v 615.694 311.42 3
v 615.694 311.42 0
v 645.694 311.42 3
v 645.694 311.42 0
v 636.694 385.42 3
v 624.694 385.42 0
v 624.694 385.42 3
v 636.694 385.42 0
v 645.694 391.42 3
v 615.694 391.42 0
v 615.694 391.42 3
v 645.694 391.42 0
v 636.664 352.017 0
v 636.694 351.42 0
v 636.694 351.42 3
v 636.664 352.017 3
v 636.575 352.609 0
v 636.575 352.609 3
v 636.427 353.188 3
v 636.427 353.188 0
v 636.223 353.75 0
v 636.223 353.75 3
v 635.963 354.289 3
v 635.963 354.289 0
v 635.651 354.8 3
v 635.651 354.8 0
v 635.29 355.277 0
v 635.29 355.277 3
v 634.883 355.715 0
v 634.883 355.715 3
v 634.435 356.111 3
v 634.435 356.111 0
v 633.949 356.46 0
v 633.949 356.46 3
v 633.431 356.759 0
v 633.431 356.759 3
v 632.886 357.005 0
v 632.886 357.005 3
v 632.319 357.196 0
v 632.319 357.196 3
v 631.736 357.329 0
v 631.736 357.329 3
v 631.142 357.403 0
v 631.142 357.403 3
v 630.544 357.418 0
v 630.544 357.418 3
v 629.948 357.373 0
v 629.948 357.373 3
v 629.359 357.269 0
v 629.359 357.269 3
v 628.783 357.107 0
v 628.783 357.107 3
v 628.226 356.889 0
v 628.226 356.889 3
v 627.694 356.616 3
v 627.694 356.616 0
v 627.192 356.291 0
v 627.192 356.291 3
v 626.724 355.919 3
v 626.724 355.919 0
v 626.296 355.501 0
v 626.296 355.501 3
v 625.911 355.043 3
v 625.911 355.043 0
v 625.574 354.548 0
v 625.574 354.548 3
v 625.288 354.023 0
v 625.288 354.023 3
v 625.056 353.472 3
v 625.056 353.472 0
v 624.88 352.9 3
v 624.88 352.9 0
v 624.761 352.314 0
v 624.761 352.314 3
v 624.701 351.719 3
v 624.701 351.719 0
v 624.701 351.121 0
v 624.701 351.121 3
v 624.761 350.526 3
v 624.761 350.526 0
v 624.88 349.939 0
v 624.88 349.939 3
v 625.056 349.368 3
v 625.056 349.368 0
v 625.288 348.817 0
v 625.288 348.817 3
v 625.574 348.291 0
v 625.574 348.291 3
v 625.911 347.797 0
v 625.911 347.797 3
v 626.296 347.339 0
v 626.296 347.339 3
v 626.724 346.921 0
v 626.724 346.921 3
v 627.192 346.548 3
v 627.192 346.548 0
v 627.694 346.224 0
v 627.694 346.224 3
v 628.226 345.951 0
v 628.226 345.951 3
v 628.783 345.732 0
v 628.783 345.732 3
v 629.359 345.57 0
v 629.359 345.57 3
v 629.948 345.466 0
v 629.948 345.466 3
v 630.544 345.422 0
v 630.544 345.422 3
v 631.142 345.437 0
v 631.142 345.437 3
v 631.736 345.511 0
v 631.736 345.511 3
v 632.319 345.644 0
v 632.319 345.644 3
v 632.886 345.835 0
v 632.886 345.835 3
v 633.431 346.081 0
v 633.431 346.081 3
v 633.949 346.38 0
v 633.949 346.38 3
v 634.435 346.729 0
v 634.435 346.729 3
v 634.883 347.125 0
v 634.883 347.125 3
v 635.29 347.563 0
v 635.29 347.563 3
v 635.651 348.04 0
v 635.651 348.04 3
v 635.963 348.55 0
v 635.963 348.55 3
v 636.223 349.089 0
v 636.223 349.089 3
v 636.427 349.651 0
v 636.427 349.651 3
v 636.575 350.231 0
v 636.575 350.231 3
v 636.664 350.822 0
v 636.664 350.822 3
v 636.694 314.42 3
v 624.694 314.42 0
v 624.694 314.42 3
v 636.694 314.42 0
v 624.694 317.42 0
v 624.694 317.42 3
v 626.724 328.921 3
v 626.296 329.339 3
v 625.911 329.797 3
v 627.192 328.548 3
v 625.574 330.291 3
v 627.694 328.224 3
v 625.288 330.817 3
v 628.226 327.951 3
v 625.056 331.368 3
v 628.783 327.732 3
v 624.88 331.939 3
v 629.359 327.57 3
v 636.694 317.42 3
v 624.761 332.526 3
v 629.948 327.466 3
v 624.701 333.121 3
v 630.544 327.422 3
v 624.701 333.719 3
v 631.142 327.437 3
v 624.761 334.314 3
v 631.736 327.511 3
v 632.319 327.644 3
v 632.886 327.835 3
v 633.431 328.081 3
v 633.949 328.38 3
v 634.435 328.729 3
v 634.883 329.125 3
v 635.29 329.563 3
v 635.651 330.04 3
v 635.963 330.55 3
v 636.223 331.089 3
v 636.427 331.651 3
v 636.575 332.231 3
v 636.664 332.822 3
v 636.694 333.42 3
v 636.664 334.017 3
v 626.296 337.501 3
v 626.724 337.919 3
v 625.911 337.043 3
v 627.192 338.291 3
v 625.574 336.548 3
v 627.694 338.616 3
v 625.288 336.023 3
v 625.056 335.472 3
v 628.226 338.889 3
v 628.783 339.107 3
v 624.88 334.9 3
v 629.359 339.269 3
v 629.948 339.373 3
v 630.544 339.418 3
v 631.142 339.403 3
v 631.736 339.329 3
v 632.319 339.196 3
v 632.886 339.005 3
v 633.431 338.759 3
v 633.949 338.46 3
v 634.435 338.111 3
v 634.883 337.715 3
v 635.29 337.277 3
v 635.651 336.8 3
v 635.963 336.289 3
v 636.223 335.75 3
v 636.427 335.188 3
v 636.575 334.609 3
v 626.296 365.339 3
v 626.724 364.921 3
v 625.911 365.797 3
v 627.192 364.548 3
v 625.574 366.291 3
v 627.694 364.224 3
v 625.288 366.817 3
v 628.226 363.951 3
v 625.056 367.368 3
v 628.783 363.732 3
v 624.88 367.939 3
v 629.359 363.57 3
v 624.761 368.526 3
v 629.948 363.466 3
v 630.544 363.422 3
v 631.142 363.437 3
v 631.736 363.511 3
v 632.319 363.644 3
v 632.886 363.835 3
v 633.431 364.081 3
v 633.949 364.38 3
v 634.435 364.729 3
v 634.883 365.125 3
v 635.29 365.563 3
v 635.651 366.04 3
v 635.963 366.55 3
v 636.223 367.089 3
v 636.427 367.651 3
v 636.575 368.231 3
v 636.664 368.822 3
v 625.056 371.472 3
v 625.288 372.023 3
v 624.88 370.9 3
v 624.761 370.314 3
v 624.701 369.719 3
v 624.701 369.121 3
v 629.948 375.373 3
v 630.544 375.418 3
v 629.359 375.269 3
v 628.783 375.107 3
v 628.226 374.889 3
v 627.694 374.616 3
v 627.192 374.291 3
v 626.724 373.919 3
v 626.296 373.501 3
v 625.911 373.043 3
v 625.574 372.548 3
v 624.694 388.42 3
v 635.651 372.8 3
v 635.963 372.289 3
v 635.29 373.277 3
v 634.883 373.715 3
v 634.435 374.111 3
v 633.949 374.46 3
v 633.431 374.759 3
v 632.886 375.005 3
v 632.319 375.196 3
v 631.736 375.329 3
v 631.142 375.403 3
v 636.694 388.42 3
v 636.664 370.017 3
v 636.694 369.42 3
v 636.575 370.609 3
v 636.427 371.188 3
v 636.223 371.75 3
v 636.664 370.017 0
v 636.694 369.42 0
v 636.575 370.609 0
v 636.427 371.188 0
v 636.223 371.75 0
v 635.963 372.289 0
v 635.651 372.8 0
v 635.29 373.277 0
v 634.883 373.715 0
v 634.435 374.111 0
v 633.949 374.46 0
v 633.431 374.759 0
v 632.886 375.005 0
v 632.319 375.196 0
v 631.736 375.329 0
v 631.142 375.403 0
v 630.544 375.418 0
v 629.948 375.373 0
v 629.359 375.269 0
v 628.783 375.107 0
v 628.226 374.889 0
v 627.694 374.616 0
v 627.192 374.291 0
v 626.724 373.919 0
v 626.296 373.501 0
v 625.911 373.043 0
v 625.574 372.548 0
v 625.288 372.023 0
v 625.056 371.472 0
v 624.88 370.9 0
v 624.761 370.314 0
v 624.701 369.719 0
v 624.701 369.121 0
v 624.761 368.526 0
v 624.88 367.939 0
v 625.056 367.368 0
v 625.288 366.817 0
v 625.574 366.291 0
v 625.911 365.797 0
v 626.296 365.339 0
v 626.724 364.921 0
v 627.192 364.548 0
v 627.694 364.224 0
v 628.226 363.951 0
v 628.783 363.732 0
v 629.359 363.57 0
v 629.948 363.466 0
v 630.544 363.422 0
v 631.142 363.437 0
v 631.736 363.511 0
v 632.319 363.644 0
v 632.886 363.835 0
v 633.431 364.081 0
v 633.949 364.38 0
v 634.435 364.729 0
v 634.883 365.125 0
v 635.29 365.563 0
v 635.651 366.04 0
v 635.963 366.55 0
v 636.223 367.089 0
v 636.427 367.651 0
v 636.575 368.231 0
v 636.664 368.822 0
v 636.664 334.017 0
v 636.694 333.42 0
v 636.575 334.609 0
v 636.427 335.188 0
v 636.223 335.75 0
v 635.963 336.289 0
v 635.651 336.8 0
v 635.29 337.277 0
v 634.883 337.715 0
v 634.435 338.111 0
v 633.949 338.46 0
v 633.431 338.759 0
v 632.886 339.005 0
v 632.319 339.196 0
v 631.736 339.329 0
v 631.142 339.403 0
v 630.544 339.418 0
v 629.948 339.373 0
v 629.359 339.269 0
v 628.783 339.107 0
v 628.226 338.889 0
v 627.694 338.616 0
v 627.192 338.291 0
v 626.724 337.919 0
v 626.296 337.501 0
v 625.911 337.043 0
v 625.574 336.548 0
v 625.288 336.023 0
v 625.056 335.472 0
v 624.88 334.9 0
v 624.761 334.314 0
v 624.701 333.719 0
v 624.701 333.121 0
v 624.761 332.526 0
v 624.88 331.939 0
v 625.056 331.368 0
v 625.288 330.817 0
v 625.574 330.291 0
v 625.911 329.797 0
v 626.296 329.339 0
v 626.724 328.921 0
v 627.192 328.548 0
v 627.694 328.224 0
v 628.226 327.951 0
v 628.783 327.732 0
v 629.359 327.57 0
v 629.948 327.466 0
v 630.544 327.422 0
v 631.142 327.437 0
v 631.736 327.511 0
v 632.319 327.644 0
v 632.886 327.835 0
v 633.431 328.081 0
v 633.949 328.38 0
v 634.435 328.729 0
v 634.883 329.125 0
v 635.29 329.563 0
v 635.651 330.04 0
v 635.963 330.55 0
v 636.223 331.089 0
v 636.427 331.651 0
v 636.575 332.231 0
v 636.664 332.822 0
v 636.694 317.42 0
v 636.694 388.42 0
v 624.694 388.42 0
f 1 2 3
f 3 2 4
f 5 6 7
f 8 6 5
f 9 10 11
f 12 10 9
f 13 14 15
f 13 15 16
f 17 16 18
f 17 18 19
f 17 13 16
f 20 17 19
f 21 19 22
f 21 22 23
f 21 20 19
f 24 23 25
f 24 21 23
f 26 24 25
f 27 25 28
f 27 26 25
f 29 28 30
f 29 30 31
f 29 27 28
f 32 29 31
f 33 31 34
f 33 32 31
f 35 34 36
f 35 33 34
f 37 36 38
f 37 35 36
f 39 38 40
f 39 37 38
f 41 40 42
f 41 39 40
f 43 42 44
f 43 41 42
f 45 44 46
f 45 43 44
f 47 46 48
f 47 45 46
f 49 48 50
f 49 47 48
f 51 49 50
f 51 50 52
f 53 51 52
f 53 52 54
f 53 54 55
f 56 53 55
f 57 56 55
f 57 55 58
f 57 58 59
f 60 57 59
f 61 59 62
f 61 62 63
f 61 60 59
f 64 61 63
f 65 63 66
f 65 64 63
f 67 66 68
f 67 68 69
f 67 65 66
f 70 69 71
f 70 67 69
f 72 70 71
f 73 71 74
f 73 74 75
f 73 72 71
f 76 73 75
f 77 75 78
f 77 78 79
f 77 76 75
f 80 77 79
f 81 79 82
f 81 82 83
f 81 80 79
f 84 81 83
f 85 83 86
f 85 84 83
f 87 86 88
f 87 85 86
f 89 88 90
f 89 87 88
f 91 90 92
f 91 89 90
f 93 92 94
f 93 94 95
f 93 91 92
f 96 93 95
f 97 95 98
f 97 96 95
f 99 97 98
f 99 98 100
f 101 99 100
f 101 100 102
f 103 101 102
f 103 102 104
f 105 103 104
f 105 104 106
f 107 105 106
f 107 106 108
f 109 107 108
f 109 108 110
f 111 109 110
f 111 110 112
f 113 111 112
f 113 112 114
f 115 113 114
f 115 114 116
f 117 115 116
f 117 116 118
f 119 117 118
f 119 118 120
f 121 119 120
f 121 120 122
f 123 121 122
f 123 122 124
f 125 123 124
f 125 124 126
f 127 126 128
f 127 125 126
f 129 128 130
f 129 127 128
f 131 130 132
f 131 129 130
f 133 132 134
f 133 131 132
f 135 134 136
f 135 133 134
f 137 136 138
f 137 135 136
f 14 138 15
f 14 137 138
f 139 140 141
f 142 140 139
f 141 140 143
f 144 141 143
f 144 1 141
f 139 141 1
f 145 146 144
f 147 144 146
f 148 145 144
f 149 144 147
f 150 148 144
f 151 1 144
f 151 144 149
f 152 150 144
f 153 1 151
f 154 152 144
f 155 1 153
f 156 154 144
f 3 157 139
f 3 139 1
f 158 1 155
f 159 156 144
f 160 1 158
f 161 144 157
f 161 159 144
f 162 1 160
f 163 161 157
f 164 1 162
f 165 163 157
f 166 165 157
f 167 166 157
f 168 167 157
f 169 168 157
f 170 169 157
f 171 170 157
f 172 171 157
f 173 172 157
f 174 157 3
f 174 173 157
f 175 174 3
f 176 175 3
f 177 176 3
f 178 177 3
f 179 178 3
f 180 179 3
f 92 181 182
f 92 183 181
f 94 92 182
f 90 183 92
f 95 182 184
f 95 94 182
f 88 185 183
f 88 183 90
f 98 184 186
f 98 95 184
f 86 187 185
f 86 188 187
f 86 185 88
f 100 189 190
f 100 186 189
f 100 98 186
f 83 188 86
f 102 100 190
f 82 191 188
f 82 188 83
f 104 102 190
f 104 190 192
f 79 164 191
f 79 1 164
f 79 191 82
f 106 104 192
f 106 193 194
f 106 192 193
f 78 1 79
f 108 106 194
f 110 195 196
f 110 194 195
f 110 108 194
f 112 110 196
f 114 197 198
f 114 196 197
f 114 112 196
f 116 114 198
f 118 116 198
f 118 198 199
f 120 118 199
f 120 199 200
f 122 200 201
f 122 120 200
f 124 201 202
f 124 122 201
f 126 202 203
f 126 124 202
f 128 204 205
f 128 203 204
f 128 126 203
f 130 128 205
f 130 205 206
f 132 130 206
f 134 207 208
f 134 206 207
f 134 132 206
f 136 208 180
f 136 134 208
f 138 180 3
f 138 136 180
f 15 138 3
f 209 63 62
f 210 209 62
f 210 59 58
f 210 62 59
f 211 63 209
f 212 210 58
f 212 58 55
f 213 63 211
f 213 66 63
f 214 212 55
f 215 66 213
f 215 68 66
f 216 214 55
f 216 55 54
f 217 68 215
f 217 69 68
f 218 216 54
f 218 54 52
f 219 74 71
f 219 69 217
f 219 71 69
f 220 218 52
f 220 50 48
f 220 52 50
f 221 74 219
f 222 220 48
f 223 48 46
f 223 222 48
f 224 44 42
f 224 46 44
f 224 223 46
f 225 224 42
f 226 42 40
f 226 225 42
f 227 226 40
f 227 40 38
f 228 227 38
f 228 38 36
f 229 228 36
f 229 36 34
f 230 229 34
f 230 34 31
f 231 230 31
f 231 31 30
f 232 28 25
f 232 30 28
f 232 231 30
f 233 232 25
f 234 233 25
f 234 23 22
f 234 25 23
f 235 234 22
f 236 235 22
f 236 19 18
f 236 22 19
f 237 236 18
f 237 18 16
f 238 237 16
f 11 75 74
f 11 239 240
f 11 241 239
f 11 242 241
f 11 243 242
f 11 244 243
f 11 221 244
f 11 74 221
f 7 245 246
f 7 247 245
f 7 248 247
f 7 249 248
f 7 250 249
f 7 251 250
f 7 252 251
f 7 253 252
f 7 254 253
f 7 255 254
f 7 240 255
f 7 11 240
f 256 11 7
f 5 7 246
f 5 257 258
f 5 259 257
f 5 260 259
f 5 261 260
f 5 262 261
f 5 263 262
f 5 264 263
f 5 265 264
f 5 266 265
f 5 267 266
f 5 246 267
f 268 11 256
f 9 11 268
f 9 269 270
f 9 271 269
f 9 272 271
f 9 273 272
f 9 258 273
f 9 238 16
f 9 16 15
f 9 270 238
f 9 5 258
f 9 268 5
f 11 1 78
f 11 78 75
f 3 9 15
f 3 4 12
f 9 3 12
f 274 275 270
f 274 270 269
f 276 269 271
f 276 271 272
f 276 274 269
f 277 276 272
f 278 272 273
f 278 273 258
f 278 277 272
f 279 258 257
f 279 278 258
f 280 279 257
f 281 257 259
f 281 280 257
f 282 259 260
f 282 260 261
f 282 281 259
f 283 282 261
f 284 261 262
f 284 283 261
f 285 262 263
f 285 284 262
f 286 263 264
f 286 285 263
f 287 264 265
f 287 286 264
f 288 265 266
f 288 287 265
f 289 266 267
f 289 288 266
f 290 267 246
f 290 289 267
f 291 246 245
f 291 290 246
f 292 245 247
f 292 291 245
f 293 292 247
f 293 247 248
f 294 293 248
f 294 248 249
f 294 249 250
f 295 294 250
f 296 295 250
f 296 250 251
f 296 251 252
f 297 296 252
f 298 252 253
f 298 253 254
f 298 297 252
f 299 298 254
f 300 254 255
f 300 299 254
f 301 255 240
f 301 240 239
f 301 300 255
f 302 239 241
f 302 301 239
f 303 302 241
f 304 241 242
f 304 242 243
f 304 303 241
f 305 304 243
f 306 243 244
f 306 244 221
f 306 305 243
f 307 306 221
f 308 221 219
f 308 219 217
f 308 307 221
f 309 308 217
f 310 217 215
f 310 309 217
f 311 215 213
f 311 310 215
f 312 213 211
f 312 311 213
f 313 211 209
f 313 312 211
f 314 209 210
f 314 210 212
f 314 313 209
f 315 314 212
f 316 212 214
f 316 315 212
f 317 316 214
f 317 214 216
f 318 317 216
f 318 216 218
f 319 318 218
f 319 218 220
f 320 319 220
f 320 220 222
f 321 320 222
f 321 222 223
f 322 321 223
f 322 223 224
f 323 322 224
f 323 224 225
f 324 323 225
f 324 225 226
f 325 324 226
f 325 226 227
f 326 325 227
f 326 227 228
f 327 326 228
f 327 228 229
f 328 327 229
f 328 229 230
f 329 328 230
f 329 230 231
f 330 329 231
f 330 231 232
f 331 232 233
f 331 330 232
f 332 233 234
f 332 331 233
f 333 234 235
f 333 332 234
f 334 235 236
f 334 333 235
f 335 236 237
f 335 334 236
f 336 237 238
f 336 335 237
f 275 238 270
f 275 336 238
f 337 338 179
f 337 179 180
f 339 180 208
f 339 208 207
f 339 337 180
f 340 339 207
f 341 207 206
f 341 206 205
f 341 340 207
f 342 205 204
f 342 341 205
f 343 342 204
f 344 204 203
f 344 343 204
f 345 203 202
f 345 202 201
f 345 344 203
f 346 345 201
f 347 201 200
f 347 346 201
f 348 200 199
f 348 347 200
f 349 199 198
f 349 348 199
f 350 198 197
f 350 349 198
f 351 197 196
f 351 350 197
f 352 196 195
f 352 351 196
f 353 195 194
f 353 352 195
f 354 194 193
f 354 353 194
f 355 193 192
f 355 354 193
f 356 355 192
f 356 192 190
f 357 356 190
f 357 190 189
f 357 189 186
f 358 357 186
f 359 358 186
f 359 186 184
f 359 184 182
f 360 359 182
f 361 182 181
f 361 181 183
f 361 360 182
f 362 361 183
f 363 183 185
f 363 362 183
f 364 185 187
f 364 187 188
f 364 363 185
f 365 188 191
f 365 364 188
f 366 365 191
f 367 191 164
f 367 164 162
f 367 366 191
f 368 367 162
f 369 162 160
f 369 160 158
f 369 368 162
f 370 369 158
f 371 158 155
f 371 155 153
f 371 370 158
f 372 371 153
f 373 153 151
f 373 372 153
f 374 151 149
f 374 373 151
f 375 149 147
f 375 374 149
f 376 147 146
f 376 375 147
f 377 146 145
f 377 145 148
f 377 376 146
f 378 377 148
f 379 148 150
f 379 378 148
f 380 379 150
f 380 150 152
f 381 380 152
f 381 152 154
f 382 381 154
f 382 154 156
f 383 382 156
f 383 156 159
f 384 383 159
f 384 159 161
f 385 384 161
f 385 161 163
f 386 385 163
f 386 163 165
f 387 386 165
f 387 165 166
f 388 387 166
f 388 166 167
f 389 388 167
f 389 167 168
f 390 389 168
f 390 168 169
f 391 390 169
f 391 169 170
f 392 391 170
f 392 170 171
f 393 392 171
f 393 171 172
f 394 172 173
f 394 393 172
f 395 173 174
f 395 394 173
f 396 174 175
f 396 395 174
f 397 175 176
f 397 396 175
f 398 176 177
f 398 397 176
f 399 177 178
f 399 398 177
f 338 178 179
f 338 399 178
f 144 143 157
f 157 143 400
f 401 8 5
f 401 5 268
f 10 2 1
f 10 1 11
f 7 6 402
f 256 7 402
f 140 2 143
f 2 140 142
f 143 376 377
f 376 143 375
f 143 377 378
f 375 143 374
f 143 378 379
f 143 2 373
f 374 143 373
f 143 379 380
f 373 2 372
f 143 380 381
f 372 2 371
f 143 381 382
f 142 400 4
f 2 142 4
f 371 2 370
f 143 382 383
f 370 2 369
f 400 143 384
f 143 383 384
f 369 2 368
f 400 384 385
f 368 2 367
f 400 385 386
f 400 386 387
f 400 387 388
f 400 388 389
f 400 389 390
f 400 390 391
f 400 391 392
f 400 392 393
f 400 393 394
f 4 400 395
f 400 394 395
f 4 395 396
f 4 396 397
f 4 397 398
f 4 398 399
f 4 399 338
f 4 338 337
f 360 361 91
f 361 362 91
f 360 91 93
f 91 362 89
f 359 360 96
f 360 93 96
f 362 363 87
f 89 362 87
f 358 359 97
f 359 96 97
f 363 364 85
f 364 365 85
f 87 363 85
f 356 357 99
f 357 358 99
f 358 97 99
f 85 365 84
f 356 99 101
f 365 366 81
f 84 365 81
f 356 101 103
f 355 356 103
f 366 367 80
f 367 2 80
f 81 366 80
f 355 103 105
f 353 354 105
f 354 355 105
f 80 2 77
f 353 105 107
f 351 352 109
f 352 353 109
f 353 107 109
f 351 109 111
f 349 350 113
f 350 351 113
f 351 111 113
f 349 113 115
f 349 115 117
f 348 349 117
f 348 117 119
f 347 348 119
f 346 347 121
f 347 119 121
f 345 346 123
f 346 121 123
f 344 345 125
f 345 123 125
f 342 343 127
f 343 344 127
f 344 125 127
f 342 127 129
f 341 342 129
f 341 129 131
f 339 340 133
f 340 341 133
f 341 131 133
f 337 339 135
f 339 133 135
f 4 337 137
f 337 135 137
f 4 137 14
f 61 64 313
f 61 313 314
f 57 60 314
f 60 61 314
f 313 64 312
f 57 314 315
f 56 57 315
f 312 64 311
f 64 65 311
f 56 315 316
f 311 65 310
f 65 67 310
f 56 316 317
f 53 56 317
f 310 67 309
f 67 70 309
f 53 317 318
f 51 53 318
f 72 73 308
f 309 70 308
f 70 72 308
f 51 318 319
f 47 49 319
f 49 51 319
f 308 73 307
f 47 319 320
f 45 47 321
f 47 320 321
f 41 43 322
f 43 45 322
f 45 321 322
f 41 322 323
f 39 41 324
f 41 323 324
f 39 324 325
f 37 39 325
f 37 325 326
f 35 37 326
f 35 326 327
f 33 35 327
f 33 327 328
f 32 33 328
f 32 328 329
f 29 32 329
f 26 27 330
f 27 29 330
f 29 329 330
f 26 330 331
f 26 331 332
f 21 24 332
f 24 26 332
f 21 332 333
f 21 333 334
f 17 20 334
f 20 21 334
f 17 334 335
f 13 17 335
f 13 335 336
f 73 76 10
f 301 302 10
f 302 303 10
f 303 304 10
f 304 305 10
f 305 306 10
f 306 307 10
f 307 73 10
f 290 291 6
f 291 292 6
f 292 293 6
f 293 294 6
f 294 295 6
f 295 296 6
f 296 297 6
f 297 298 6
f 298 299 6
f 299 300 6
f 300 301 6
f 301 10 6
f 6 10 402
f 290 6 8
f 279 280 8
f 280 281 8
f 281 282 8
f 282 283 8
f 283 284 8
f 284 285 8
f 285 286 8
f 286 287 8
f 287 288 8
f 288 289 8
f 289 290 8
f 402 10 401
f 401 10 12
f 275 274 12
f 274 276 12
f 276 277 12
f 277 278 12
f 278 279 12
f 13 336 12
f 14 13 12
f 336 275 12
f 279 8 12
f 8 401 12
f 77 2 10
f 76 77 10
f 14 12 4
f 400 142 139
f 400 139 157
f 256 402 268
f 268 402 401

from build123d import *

# Parameters (mm, degrees)
SKETCH_1_W      = 30
SKETCH_1_H      = 80
SKETCH_1_R      = 6
SKETCH_1_W_2    = 12
SKETCH_1_H_2    = 3
EXTRUDE_1_DEPTH = 3


with BuildPart() as part:
    # 草图1 → 凸台-拉伸1 (new body)
    with BuildSketch(Plane.XY):
        with Locations((630.693975789, 351.419851644)):
            Rectangle(SKETCH_1_W, SKETCH_1_H)
        with Locations((630.693975789, 351.419851644)):
            Circle(SKETCH_1_R, mode=Mode.SUBTRACT)
        with Locations((630.693975789, 369.419851644)):
            Circle(SKETCH_1_R, mode=Mode.SUBTRACT)
        with Locations((630.693975789, 333.419851644)):
            Circle(SKETCH_1_R, mode=Mode.SUBTRACT)
        with Locations((630.693975789, 315.919851644)):
            Rectangle(SKETCH_1_W_2, SKETCH_1_H_2, mode=Mode.SUBTRACT)
        with Locations((630.693975789, 386.919851644)):
            Rectangle(SKETCH_1_W_2, SKETCH_1_H_2, mode=Mode.SUBTRACT)
    extrude(amount=EXTRUDE_1_DEPTH)


solid = part.part
